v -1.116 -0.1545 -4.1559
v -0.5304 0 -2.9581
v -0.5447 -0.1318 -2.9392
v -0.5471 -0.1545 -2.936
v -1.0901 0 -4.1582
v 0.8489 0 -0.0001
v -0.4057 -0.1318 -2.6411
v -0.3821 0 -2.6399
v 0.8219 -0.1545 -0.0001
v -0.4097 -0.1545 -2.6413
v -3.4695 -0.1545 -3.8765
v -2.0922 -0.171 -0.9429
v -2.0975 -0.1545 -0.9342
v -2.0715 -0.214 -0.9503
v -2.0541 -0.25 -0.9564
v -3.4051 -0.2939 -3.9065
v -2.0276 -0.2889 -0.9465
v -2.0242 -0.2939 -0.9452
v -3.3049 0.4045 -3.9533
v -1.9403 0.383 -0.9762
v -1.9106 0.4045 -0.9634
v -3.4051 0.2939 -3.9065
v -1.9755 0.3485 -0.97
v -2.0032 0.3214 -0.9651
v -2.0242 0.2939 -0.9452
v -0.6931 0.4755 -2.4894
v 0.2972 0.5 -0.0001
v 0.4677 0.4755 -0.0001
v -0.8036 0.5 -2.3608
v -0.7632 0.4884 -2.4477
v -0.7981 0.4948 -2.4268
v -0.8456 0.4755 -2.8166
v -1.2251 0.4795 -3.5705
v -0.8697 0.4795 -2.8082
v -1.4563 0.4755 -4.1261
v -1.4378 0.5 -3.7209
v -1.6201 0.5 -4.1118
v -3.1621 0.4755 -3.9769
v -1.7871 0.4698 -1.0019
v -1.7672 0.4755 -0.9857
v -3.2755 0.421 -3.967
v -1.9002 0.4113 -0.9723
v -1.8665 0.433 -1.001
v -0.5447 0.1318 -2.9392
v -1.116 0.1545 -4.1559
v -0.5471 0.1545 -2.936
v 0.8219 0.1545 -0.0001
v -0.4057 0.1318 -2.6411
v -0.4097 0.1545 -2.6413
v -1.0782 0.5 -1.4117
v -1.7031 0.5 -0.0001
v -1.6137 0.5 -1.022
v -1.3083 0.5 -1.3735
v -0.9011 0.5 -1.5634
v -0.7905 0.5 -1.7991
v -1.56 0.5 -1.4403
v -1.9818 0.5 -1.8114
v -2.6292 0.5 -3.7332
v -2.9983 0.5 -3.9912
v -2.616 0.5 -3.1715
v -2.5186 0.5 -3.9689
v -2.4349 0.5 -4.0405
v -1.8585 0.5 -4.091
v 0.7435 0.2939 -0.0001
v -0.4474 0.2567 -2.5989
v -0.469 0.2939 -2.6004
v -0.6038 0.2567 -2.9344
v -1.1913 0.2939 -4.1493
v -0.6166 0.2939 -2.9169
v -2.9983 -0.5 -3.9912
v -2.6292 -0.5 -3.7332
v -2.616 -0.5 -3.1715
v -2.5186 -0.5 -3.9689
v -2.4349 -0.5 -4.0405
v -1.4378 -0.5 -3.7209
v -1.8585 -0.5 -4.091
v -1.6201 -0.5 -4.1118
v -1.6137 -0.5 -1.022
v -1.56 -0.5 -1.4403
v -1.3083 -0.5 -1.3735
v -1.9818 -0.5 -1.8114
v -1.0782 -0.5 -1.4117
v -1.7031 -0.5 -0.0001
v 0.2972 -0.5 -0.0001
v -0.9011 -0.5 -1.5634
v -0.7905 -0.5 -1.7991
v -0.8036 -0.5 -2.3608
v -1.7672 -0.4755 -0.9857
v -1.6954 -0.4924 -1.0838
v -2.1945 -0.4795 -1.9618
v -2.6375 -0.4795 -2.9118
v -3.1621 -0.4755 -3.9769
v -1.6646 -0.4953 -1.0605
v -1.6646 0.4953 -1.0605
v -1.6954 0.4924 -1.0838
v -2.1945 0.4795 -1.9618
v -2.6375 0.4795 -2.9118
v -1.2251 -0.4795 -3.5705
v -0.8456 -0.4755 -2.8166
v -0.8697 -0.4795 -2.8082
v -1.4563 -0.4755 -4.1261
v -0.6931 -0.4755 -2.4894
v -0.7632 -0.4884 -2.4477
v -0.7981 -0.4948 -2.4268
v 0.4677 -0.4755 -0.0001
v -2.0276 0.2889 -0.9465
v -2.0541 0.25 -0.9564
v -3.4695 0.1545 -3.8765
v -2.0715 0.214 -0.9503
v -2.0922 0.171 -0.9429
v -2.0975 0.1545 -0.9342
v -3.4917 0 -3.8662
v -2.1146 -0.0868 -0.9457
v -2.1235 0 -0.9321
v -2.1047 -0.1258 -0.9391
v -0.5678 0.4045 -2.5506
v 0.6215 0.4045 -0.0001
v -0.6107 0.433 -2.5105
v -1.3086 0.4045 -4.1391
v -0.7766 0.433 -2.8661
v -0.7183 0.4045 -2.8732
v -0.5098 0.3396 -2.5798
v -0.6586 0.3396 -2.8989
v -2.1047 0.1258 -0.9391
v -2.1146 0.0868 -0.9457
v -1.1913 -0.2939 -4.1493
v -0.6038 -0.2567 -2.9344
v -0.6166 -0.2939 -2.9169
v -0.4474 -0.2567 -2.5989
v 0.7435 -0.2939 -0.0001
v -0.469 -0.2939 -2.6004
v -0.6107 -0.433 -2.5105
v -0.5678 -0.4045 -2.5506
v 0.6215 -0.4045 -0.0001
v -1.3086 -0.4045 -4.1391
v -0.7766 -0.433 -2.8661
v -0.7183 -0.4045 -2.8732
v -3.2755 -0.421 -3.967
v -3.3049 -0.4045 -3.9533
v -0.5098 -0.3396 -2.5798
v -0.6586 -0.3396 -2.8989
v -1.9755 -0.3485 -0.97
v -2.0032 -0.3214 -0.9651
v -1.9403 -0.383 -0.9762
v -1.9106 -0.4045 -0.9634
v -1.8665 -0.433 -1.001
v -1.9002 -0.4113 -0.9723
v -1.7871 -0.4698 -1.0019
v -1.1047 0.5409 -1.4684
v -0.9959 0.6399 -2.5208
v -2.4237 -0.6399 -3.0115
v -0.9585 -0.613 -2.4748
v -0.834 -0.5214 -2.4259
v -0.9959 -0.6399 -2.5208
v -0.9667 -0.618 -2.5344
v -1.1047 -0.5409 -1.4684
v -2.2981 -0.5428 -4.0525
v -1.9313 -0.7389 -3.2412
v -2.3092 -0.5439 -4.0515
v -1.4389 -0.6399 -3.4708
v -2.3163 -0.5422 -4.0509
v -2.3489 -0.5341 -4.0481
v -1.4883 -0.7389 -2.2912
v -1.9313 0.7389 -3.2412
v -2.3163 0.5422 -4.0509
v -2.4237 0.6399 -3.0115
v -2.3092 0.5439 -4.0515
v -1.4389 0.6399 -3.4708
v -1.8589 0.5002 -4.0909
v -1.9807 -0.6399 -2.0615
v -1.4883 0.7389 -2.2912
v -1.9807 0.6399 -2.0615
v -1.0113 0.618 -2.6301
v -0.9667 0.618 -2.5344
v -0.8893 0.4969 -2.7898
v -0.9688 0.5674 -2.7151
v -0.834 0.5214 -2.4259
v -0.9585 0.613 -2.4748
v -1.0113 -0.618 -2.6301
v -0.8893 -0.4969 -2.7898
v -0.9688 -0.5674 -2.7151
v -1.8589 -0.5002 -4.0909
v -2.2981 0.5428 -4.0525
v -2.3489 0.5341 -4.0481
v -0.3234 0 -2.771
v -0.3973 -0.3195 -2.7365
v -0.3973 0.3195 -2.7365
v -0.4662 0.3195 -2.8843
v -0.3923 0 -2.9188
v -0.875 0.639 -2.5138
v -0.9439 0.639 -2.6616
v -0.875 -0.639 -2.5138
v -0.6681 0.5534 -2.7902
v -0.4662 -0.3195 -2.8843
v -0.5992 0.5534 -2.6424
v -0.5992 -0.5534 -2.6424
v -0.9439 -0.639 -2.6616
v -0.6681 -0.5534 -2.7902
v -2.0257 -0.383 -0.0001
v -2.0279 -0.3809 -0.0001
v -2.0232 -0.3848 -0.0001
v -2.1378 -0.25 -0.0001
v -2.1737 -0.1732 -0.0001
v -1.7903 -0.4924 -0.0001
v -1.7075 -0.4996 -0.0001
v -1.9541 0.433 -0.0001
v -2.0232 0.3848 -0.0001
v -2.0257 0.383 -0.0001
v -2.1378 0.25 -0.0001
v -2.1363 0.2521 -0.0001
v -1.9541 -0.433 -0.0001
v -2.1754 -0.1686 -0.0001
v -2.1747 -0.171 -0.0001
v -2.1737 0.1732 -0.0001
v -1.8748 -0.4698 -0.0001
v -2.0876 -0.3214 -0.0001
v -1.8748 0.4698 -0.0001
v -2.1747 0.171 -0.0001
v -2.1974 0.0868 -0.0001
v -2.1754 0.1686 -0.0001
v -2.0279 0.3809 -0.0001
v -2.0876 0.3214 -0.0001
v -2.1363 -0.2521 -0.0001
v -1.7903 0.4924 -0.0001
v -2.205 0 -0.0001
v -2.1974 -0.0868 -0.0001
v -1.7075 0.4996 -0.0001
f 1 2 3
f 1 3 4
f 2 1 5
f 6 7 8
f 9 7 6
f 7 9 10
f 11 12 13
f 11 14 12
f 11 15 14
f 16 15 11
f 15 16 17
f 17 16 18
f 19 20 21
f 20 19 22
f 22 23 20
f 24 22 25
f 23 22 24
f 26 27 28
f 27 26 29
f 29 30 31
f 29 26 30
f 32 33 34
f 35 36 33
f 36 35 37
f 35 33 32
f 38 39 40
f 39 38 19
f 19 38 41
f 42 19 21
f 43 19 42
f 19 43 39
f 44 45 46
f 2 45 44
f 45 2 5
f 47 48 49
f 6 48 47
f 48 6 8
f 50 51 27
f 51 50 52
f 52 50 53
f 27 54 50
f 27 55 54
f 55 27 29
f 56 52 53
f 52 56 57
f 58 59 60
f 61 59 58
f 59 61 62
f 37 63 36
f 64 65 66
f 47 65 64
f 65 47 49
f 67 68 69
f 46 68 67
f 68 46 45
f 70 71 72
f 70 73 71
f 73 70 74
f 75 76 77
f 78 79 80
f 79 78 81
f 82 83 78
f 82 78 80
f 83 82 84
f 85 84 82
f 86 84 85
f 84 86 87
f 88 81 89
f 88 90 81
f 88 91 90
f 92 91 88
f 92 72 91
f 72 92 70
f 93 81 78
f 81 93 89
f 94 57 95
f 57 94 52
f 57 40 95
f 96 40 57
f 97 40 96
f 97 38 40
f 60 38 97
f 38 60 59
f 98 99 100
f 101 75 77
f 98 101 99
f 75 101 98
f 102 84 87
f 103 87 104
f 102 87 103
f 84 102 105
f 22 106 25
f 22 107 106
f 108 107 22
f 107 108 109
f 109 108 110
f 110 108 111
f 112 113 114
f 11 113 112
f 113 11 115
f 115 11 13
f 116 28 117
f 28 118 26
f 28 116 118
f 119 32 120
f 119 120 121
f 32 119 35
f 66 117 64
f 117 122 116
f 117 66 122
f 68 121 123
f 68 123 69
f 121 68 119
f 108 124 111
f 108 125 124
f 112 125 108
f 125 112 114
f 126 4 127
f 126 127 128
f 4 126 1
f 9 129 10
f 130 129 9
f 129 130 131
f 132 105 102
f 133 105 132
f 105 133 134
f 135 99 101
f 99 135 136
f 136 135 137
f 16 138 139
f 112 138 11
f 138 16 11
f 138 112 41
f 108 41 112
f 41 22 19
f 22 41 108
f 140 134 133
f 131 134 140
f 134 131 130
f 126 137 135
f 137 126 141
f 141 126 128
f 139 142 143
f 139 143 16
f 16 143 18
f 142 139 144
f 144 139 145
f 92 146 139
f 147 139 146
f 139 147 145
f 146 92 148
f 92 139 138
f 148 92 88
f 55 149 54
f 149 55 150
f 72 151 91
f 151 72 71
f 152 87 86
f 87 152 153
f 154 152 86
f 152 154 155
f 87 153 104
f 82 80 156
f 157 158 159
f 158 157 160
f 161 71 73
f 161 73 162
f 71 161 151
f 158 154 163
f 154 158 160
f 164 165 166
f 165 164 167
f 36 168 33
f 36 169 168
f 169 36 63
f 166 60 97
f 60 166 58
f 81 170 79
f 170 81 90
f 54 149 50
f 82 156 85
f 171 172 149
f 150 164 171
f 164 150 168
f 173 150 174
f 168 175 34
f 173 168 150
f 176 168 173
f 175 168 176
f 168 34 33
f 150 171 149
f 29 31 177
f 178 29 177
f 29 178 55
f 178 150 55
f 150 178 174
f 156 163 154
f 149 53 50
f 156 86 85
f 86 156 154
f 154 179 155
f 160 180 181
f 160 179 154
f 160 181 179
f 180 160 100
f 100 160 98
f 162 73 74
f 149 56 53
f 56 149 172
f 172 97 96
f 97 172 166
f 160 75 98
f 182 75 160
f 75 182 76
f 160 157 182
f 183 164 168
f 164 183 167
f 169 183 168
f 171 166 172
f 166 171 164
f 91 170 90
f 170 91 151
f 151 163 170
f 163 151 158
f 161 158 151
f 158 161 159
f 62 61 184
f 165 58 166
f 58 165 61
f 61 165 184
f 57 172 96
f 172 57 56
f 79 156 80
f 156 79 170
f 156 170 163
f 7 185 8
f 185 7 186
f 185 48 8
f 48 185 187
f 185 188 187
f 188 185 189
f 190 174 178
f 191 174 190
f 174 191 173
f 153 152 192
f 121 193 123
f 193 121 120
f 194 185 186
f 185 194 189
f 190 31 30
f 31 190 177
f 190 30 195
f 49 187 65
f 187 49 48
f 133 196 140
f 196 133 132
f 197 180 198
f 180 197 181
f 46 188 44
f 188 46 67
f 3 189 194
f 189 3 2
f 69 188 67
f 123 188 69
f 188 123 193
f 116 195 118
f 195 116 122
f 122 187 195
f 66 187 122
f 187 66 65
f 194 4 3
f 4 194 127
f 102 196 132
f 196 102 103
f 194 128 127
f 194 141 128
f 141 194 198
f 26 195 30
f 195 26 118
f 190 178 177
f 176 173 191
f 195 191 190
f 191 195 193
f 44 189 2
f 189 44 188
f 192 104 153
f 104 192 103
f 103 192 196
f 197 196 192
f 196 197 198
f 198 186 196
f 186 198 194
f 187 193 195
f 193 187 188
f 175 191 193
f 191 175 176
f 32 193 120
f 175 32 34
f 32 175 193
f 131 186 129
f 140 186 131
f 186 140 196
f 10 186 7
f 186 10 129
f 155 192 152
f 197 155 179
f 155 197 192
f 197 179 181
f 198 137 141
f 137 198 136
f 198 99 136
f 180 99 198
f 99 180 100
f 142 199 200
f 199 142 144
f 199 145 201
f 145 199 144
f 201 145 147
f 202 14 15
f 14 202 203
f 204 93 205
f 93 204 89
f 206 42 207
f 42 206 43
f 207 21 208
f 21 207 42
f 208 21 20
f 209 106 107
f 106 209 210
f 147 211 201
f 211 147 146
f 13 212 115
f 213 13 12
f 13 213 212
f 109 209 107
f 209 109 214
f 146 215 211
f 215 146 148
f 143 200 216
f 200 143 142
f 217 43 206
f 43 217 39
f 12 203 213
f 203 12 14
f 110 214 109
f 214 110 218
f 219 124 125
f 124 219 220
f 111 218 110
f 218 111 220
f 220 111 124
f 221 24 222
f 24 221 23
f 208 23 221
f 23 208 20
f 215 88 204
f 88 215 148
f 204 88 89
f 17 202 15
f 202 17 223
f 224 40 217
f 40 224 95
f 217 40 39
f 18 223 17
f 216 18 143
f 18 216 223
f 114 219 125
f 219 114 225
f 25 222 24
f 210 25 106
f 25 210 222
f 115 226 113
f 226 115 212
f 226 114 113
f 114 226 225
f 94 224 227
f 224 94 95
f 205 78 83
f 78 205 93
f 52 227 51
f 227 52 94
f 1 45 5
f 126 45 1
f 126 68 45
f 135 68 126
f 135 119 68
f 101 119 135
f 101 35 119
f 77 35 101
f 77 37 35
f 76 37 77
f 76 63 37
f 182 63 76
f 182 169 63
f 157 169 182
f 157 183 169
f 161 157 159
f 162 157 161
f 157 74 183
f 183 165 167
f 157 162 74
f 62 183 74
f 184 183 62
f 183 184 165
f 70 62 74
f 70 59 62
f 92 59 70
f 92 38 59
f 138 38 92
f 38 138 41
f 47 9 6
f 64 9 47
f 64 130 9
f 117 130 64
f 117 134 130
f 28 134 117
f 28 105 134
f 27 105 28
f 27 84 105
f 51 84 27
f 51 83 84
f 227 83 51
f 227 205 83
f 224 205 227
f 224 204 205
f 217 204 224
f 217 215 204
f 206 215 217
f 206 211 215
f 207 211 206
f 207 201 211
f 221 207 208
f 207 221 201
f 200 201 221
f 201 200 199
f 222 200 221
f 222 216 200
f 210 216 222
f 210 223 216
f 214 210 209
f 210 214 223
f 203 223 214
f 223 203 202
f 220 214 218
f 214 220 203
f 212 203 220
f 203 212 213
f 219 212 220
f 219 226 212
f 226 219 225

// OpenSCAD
// file: ../../Meta/Units.scad
Millimeters = 1;
Inches = 2;

DEFAULT_UNITS = Inches;

function Units() = DEFAULT_UNITS;
function UnitsFs() = Units() == Millimeters ? 2 : 2/25.4;

function InchesToMillimeters(n) = n * 25.4;
function MillimetersToInches(n) = n / 25.4;

function Millimeters(n)   = Units() == Millimeters   ? n : MillimetersToInches(n);
function Inches(n) = Units() == Inches ? n : InchesToMillimeters(n);

module ScaleToMillimeters() {
  if (Units() == Inches) {
    scale(25.4)
    children();
  } else {
    children();
  }
}
// file: ../../Meta/Resolution.scad
// Constants
RESOLUTION_LOW = 0;
RESOLUTION_HIGH = 1;

// Setting
RESOLUTION = RESOLUTION_LOW;

// Utility functions
function ResolutionIsLow() = RESOLUTION == RESOLUTION_LOW;
function ResolutionIsHigh() = RESOLUTION == RESOLUTION_HIGH;
function Resolution(low, high) = ResolutionIsLow() ? low : high;
function ResolutionFs() = Resolution(1, 0.25);
function ResolutionFa() = Resolution(10, 4);
// file: ../../Meta/Manifold.scad
// Settings: Manifold Gap
MANIFOLD_GAP = 0.0001;

function ManifoldGap(n=1) = MANIFOLD_GAP*n;
// main file
use <../../Meta/Manifold.scad>;
use <../../Meta/Resolution.scad>;
use <../../Meta/Units.scad>;

// *********
// * Setup *
// *********
$fa = ResolutionFa();
$fs = UnitsFs()*ResolutionFs();

module GripHandle(angle=25, gripWidth=1, gripCeiling=0.75, length=1.3, height=5.5, showPalmSwell=true, showFingerSwell=true) {
  handleOffsetZ = 1.3825-gripCeiling;
  palmSwellOffsetZ=-3.0-gripCeiling;
  fingerSwellOffsetZ=-2.5-gripCeiling;

  difference() {


    union() {

      // Angled section of the grip
      translate([-0.125,0,handleOffsetZ])
      rotate([0,angle,0]) {

        // Grip Body
        translate([-length/2,0,-height])
        hull()
        for (i=[0,length])
        translate([i,0,0])
        cylinder(r=gripWidth/2, h=height, $fn=Resolution(20, 60));

        // Palm swell
        if (showPalmSwell)
        translate([0,0,palmSwellOffsetZ])
        scale([2.5,1.7,4.5])
        sphere(r=0.45, $fn=Resolution(12, 60));

        // Finger swell
        if (showFingerSwell)
        translate([length/2,0,fingerSwellOffsetZ])
        scale([1,1.05,0.5])
        sphere(r=0.63, $fn=Resolution(12, 60));
      }

      // Backstrap to meet the web of the hand
      hull()
      for (extraX = [0,length/2])
      translate([-length-0.25+extraX, 0, -gripCeiling-1])
      rotate([0,-5,0])
      cylinder(r=gripWidth/2, h=1.1+gripCeiling);
    }

    // Flatten the bottom
    translate([-4.5,-1,handleOffsetZ-6.5])
    rotate([0,5,0])
    cube([4, 2, 2]);

    // Flatten the top
    translate([-3,-2, -ManifoldGap()])
    cube([6, 4, 3]);
  }
}

GripHandle();
